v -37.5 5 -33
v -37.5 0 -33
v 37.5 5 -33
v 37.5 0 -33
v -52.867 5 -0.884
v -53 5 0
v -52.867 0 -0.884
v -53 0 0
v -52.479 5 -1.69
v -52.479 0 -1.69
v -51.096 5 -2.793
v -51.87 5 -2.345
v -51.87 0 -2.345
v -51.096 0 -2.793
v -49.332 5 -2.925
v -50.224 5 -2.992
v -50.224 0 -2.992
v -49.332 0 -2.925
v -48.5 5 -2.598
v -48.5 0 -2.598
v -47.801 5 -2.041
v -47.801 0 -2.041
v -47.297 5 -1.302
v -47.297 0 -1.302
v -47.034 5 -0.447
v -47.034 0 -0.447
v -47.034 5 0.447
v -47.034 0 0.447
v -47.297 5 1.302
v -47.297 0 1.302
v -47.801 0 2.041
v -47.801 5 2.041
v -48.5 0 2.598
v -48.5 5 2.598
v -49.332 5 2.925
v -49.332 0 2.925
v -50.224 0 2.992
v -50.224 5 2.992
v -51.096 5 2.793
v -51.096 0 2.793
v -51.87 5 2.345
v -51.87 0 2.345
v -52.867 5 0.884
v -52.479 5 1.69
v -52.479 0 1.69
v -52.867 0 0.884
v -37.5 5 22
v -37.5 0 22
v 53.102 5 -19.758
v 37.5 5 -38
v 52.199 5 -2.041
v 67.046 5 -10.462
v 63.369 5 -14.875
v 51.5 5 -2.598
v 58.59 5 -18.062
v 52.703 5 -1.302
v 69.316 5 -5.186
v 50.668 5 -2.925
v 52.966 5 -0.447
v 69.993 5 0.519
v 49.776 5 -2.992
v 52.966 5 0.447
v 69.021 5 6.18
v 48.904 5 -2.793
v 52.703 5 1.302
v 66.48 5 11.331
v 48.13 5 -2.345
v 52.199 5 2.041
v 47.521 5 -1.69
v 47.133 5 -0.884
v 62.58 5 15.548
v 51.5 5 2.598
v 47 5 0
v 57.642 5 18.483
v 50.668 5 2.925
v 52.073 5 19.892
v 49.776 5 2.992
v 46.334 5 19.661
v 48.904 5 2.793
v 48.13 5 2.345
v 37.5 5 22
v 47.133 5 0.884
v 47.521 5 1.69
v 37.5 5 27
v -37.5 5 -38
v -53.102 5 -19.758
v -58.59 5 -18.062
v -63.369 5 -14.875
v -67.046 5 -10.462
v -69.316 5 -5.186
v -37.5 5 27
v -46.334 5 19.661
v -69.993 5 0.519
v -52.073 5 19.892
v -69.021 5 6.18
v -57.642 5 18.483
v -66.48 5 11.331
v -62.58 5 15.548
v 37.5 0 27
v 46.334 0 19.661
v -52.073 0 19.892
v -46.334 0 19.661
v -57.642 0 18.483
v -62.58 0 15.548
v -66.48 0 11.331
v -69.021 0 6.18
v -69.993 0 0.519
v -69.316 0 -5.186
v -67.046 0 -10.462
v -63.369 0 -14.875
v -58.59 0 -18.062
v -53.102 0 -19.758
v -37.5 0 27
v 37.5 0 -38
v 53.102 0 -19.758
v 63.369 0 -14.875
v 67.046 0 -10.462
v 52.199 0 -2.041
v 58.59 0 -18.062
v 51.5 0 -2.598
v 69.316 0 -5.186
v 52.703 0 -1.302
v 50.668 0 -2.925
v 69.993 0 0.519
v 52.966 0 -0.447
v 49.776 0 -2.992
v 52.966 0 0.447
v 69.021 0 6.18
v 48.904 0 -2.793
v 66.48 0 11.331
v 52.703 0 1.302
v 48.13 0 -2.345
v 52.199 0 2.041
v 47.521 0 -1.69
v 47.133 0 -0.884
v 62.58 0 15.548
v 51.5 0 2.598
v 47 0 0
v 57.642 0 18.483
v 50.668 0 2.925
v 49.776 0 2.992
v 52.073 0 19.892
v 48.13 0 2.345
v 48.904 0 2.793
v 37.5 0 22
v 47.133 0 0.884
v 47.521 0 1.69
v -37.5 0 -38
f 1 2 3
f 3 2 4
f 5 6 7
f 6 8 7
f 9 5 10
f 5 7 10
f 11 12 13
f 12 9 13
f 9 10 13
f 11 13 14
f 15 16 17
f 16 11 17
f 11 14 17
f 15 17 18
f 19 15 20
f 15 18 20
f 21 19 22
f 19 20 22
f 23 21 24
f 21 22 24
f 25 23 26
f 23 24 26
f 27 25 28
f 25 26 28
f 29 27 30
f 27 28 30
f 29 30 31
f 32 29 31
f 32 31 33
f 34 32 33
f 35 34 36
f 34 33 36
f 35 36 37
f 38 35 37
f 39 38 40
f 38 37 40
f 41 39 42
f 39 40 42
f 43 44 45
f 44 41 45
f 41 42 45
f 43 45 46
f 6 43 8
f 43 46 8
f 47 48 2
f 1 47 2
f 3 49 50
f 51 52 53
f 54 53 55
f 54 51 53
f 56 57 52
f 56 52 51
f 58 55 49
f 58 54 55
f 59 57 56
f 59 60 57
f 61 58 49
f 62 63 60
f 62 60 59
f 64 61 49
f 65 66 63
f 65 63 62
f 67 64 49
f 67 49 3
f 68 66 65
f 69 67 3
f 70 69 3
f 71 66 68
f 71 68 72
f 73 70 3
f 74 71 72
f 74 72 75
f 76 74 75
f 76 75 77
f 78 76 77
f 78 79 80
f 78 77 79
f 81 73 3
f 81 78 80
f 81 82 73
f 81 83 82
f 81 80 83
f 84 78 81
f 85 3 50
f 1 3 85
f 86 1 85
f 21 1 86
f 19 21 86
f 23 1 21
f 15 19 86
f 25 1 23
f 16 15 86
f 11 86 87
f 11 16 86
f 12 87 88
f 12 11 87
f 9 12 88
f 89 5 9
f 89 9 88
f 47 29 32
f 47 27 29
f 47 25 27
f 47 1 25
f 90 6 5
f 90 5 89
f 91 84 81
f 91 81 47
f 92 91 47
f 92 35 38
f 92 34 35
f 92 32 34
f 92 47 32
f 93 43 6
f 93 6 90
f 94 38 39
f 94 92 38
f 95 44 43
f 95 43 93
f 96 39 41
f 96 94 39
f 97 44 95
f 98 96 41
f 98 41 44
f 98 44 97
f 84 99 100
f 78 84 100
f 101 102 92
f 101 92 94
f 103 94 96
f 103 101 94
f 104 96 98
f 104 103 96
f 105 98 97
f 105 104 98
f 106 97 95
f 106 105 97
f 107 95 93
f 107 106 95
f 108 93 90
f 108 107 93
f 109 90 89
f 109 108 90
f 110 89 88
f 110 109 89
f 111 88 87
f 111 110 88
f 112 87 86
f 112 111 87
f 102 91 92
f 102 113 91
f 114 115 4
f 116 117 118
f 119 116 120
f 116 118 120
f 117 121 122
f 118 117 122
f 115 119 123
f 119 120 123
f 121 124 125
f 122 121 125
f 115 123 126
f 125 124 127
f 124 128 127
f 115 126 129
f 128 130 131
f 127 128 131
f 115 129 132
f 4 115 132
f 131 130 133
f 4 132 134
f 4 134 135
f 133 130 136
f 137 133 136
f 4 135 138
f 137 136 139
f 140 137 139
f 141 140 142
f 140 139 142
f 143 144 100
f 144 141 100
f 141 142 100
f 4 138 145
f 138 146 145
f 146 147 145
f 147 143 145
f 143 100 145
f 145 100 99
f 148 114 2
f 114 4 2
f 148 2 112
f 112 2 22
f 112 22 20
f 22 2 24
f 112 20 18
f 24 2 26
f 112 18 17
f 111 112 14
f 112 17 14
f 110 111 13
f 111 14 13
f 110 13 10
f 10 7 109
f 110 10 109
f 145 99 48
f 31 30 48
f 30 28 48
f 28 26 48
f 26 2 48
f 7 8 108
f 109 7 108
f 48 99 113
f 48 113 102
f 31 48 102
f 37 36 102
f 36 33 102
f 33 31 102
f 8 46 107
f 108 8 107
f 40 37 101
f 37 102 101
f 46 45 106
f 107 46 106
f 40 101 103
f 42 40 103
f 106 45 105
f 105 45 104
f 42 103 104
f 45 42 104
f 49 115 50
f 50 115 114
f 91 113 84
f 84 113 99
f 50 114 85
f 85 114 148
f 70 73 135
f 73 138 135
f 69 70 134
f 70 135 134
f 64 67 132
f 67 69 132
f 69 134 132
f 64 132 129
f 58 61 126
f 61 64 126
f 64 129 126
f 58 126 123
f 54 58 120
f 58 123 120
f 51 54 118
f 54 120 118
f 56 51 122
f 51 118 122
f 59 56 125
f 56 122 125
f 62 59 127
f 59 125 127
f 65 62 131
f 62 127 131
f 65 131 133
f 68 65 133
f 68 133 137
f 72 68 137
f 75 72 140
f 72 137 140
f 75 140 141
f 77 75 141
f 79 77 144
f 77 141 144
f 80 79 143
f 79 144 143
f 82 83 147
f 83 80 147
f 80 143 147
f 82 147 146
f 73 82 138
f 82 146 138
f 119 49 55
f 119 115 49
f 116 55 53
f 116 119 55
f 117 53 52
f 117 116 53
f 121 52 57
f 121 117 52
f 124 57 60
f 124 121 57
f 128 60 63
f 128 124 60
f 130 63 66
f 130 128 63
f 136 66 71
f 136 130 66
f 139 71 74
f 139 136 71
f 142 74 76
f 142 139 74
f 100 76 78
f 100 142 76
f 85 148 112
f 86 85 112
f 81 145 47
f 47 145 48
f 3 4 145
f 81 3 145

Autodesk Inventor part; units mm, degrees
ref_plane "YZ Plane" through (0, 0, 0) normal (1, 0, 0) x (0, 1, 0)
ref_plane "XZ Plane" through (0, 0, 0) normal (0, 1, 0) x (-1, 0, 0)
ref_plane "XY Plane" through (0, 0, 0) normal (0, 0, 1) x (1, 0, 0)
sketch "Esquisse1" plane through (0, 0, 0) normal (0, 1, 0) x (-1, 0, 0)
  line L0 (-37.5, 22) -> (37.5, 22)
  line L1 (37.5, 22) -> (37.5, -33)
  line L2 (37.5, -33) -> (-37.5, -33)
  line L3 (-37.5, -33) -> (-37.5, 22)
  line L4 (-37.5, 22) -> (37.5, 22)
  line L5 (37.5, 22) -> (37.5, 27)
  line L6 (37.5, 27) -> (-37.5, 27)
  line L7 (-37.5, 27) -> (-37.5, 22)
  line L8 (37.5, -33) -> (-37.5, -33)
  line L9 (-37.5, -33) -> (-37.5, -38)
  line L10 (-37.5, -38) -> (37.5, -38)
  line L11 (37.5, -38) -> (37.5, -33)
  circle A0 centre (-50, 0) radius 3
  arc A1 (-37.5, 15.6125) -> (-37.5, -15.6125) centre (-50, 0) ccw
  circle A2 centre (50, 0) radius 3
  arc A3 (37.5, -15.6125) -> (37.5, 15.6125) centre (50, 0) ccw
  line L12 (0, 0) -> (124.0045, 0) construction
  line L13 (-37.5, 27) -> (-70, 0)
  line L14 (-70, 0) -> (-37.5, -38)
  line L15 (37.5, 27) -> (70, 0)
  line L16 (37.5, -38) -> (70, 0)
  arc A4 (-37.5, -15.6125) -> (-37.5, 15.6125) centre (-50, 0) ccw
  arc A5 (30, 0) -> (37.5, -15.6125) centre (50, 0) ccw
  arc A6 (37.5, 15.6125) -> (30, 0) centre (50, 0) ccw
  dimension "d0" = 6
  dimension "d1" = 6
  dimension "d2" = 40
  dimension "d3" = 40
  dimension "d4" = 75
  dimension "d5" = 37.5
  dimension "d6" = 22
  dimension "d7" = 55
  dimension "d8" = 5
  dimension "d9" = 5
  dimension "d10" = 100
  dimension "d11" = 50
extrude "Extrusion1" add sketch "Esquisse1" along normal blind 5 contours L7 L6 L5 L0 | L3 A1 L13 L7 | L5 L15 A3 L1 | L3 A1 L14 L13 | A3 L15 L16 L1 | L3 L9 L14 A1 | L13 A1 | A3 L16 L11 L1 | A3 L15 | L2 L11 L10 L9 | A1 L14 | L16 A3
equation "\"d5\" = 0.5 * d4"
equation "\"d9\" = d8"
equation "\"d11\" = 0.5 * d10"
properties part number "support_batteries"
